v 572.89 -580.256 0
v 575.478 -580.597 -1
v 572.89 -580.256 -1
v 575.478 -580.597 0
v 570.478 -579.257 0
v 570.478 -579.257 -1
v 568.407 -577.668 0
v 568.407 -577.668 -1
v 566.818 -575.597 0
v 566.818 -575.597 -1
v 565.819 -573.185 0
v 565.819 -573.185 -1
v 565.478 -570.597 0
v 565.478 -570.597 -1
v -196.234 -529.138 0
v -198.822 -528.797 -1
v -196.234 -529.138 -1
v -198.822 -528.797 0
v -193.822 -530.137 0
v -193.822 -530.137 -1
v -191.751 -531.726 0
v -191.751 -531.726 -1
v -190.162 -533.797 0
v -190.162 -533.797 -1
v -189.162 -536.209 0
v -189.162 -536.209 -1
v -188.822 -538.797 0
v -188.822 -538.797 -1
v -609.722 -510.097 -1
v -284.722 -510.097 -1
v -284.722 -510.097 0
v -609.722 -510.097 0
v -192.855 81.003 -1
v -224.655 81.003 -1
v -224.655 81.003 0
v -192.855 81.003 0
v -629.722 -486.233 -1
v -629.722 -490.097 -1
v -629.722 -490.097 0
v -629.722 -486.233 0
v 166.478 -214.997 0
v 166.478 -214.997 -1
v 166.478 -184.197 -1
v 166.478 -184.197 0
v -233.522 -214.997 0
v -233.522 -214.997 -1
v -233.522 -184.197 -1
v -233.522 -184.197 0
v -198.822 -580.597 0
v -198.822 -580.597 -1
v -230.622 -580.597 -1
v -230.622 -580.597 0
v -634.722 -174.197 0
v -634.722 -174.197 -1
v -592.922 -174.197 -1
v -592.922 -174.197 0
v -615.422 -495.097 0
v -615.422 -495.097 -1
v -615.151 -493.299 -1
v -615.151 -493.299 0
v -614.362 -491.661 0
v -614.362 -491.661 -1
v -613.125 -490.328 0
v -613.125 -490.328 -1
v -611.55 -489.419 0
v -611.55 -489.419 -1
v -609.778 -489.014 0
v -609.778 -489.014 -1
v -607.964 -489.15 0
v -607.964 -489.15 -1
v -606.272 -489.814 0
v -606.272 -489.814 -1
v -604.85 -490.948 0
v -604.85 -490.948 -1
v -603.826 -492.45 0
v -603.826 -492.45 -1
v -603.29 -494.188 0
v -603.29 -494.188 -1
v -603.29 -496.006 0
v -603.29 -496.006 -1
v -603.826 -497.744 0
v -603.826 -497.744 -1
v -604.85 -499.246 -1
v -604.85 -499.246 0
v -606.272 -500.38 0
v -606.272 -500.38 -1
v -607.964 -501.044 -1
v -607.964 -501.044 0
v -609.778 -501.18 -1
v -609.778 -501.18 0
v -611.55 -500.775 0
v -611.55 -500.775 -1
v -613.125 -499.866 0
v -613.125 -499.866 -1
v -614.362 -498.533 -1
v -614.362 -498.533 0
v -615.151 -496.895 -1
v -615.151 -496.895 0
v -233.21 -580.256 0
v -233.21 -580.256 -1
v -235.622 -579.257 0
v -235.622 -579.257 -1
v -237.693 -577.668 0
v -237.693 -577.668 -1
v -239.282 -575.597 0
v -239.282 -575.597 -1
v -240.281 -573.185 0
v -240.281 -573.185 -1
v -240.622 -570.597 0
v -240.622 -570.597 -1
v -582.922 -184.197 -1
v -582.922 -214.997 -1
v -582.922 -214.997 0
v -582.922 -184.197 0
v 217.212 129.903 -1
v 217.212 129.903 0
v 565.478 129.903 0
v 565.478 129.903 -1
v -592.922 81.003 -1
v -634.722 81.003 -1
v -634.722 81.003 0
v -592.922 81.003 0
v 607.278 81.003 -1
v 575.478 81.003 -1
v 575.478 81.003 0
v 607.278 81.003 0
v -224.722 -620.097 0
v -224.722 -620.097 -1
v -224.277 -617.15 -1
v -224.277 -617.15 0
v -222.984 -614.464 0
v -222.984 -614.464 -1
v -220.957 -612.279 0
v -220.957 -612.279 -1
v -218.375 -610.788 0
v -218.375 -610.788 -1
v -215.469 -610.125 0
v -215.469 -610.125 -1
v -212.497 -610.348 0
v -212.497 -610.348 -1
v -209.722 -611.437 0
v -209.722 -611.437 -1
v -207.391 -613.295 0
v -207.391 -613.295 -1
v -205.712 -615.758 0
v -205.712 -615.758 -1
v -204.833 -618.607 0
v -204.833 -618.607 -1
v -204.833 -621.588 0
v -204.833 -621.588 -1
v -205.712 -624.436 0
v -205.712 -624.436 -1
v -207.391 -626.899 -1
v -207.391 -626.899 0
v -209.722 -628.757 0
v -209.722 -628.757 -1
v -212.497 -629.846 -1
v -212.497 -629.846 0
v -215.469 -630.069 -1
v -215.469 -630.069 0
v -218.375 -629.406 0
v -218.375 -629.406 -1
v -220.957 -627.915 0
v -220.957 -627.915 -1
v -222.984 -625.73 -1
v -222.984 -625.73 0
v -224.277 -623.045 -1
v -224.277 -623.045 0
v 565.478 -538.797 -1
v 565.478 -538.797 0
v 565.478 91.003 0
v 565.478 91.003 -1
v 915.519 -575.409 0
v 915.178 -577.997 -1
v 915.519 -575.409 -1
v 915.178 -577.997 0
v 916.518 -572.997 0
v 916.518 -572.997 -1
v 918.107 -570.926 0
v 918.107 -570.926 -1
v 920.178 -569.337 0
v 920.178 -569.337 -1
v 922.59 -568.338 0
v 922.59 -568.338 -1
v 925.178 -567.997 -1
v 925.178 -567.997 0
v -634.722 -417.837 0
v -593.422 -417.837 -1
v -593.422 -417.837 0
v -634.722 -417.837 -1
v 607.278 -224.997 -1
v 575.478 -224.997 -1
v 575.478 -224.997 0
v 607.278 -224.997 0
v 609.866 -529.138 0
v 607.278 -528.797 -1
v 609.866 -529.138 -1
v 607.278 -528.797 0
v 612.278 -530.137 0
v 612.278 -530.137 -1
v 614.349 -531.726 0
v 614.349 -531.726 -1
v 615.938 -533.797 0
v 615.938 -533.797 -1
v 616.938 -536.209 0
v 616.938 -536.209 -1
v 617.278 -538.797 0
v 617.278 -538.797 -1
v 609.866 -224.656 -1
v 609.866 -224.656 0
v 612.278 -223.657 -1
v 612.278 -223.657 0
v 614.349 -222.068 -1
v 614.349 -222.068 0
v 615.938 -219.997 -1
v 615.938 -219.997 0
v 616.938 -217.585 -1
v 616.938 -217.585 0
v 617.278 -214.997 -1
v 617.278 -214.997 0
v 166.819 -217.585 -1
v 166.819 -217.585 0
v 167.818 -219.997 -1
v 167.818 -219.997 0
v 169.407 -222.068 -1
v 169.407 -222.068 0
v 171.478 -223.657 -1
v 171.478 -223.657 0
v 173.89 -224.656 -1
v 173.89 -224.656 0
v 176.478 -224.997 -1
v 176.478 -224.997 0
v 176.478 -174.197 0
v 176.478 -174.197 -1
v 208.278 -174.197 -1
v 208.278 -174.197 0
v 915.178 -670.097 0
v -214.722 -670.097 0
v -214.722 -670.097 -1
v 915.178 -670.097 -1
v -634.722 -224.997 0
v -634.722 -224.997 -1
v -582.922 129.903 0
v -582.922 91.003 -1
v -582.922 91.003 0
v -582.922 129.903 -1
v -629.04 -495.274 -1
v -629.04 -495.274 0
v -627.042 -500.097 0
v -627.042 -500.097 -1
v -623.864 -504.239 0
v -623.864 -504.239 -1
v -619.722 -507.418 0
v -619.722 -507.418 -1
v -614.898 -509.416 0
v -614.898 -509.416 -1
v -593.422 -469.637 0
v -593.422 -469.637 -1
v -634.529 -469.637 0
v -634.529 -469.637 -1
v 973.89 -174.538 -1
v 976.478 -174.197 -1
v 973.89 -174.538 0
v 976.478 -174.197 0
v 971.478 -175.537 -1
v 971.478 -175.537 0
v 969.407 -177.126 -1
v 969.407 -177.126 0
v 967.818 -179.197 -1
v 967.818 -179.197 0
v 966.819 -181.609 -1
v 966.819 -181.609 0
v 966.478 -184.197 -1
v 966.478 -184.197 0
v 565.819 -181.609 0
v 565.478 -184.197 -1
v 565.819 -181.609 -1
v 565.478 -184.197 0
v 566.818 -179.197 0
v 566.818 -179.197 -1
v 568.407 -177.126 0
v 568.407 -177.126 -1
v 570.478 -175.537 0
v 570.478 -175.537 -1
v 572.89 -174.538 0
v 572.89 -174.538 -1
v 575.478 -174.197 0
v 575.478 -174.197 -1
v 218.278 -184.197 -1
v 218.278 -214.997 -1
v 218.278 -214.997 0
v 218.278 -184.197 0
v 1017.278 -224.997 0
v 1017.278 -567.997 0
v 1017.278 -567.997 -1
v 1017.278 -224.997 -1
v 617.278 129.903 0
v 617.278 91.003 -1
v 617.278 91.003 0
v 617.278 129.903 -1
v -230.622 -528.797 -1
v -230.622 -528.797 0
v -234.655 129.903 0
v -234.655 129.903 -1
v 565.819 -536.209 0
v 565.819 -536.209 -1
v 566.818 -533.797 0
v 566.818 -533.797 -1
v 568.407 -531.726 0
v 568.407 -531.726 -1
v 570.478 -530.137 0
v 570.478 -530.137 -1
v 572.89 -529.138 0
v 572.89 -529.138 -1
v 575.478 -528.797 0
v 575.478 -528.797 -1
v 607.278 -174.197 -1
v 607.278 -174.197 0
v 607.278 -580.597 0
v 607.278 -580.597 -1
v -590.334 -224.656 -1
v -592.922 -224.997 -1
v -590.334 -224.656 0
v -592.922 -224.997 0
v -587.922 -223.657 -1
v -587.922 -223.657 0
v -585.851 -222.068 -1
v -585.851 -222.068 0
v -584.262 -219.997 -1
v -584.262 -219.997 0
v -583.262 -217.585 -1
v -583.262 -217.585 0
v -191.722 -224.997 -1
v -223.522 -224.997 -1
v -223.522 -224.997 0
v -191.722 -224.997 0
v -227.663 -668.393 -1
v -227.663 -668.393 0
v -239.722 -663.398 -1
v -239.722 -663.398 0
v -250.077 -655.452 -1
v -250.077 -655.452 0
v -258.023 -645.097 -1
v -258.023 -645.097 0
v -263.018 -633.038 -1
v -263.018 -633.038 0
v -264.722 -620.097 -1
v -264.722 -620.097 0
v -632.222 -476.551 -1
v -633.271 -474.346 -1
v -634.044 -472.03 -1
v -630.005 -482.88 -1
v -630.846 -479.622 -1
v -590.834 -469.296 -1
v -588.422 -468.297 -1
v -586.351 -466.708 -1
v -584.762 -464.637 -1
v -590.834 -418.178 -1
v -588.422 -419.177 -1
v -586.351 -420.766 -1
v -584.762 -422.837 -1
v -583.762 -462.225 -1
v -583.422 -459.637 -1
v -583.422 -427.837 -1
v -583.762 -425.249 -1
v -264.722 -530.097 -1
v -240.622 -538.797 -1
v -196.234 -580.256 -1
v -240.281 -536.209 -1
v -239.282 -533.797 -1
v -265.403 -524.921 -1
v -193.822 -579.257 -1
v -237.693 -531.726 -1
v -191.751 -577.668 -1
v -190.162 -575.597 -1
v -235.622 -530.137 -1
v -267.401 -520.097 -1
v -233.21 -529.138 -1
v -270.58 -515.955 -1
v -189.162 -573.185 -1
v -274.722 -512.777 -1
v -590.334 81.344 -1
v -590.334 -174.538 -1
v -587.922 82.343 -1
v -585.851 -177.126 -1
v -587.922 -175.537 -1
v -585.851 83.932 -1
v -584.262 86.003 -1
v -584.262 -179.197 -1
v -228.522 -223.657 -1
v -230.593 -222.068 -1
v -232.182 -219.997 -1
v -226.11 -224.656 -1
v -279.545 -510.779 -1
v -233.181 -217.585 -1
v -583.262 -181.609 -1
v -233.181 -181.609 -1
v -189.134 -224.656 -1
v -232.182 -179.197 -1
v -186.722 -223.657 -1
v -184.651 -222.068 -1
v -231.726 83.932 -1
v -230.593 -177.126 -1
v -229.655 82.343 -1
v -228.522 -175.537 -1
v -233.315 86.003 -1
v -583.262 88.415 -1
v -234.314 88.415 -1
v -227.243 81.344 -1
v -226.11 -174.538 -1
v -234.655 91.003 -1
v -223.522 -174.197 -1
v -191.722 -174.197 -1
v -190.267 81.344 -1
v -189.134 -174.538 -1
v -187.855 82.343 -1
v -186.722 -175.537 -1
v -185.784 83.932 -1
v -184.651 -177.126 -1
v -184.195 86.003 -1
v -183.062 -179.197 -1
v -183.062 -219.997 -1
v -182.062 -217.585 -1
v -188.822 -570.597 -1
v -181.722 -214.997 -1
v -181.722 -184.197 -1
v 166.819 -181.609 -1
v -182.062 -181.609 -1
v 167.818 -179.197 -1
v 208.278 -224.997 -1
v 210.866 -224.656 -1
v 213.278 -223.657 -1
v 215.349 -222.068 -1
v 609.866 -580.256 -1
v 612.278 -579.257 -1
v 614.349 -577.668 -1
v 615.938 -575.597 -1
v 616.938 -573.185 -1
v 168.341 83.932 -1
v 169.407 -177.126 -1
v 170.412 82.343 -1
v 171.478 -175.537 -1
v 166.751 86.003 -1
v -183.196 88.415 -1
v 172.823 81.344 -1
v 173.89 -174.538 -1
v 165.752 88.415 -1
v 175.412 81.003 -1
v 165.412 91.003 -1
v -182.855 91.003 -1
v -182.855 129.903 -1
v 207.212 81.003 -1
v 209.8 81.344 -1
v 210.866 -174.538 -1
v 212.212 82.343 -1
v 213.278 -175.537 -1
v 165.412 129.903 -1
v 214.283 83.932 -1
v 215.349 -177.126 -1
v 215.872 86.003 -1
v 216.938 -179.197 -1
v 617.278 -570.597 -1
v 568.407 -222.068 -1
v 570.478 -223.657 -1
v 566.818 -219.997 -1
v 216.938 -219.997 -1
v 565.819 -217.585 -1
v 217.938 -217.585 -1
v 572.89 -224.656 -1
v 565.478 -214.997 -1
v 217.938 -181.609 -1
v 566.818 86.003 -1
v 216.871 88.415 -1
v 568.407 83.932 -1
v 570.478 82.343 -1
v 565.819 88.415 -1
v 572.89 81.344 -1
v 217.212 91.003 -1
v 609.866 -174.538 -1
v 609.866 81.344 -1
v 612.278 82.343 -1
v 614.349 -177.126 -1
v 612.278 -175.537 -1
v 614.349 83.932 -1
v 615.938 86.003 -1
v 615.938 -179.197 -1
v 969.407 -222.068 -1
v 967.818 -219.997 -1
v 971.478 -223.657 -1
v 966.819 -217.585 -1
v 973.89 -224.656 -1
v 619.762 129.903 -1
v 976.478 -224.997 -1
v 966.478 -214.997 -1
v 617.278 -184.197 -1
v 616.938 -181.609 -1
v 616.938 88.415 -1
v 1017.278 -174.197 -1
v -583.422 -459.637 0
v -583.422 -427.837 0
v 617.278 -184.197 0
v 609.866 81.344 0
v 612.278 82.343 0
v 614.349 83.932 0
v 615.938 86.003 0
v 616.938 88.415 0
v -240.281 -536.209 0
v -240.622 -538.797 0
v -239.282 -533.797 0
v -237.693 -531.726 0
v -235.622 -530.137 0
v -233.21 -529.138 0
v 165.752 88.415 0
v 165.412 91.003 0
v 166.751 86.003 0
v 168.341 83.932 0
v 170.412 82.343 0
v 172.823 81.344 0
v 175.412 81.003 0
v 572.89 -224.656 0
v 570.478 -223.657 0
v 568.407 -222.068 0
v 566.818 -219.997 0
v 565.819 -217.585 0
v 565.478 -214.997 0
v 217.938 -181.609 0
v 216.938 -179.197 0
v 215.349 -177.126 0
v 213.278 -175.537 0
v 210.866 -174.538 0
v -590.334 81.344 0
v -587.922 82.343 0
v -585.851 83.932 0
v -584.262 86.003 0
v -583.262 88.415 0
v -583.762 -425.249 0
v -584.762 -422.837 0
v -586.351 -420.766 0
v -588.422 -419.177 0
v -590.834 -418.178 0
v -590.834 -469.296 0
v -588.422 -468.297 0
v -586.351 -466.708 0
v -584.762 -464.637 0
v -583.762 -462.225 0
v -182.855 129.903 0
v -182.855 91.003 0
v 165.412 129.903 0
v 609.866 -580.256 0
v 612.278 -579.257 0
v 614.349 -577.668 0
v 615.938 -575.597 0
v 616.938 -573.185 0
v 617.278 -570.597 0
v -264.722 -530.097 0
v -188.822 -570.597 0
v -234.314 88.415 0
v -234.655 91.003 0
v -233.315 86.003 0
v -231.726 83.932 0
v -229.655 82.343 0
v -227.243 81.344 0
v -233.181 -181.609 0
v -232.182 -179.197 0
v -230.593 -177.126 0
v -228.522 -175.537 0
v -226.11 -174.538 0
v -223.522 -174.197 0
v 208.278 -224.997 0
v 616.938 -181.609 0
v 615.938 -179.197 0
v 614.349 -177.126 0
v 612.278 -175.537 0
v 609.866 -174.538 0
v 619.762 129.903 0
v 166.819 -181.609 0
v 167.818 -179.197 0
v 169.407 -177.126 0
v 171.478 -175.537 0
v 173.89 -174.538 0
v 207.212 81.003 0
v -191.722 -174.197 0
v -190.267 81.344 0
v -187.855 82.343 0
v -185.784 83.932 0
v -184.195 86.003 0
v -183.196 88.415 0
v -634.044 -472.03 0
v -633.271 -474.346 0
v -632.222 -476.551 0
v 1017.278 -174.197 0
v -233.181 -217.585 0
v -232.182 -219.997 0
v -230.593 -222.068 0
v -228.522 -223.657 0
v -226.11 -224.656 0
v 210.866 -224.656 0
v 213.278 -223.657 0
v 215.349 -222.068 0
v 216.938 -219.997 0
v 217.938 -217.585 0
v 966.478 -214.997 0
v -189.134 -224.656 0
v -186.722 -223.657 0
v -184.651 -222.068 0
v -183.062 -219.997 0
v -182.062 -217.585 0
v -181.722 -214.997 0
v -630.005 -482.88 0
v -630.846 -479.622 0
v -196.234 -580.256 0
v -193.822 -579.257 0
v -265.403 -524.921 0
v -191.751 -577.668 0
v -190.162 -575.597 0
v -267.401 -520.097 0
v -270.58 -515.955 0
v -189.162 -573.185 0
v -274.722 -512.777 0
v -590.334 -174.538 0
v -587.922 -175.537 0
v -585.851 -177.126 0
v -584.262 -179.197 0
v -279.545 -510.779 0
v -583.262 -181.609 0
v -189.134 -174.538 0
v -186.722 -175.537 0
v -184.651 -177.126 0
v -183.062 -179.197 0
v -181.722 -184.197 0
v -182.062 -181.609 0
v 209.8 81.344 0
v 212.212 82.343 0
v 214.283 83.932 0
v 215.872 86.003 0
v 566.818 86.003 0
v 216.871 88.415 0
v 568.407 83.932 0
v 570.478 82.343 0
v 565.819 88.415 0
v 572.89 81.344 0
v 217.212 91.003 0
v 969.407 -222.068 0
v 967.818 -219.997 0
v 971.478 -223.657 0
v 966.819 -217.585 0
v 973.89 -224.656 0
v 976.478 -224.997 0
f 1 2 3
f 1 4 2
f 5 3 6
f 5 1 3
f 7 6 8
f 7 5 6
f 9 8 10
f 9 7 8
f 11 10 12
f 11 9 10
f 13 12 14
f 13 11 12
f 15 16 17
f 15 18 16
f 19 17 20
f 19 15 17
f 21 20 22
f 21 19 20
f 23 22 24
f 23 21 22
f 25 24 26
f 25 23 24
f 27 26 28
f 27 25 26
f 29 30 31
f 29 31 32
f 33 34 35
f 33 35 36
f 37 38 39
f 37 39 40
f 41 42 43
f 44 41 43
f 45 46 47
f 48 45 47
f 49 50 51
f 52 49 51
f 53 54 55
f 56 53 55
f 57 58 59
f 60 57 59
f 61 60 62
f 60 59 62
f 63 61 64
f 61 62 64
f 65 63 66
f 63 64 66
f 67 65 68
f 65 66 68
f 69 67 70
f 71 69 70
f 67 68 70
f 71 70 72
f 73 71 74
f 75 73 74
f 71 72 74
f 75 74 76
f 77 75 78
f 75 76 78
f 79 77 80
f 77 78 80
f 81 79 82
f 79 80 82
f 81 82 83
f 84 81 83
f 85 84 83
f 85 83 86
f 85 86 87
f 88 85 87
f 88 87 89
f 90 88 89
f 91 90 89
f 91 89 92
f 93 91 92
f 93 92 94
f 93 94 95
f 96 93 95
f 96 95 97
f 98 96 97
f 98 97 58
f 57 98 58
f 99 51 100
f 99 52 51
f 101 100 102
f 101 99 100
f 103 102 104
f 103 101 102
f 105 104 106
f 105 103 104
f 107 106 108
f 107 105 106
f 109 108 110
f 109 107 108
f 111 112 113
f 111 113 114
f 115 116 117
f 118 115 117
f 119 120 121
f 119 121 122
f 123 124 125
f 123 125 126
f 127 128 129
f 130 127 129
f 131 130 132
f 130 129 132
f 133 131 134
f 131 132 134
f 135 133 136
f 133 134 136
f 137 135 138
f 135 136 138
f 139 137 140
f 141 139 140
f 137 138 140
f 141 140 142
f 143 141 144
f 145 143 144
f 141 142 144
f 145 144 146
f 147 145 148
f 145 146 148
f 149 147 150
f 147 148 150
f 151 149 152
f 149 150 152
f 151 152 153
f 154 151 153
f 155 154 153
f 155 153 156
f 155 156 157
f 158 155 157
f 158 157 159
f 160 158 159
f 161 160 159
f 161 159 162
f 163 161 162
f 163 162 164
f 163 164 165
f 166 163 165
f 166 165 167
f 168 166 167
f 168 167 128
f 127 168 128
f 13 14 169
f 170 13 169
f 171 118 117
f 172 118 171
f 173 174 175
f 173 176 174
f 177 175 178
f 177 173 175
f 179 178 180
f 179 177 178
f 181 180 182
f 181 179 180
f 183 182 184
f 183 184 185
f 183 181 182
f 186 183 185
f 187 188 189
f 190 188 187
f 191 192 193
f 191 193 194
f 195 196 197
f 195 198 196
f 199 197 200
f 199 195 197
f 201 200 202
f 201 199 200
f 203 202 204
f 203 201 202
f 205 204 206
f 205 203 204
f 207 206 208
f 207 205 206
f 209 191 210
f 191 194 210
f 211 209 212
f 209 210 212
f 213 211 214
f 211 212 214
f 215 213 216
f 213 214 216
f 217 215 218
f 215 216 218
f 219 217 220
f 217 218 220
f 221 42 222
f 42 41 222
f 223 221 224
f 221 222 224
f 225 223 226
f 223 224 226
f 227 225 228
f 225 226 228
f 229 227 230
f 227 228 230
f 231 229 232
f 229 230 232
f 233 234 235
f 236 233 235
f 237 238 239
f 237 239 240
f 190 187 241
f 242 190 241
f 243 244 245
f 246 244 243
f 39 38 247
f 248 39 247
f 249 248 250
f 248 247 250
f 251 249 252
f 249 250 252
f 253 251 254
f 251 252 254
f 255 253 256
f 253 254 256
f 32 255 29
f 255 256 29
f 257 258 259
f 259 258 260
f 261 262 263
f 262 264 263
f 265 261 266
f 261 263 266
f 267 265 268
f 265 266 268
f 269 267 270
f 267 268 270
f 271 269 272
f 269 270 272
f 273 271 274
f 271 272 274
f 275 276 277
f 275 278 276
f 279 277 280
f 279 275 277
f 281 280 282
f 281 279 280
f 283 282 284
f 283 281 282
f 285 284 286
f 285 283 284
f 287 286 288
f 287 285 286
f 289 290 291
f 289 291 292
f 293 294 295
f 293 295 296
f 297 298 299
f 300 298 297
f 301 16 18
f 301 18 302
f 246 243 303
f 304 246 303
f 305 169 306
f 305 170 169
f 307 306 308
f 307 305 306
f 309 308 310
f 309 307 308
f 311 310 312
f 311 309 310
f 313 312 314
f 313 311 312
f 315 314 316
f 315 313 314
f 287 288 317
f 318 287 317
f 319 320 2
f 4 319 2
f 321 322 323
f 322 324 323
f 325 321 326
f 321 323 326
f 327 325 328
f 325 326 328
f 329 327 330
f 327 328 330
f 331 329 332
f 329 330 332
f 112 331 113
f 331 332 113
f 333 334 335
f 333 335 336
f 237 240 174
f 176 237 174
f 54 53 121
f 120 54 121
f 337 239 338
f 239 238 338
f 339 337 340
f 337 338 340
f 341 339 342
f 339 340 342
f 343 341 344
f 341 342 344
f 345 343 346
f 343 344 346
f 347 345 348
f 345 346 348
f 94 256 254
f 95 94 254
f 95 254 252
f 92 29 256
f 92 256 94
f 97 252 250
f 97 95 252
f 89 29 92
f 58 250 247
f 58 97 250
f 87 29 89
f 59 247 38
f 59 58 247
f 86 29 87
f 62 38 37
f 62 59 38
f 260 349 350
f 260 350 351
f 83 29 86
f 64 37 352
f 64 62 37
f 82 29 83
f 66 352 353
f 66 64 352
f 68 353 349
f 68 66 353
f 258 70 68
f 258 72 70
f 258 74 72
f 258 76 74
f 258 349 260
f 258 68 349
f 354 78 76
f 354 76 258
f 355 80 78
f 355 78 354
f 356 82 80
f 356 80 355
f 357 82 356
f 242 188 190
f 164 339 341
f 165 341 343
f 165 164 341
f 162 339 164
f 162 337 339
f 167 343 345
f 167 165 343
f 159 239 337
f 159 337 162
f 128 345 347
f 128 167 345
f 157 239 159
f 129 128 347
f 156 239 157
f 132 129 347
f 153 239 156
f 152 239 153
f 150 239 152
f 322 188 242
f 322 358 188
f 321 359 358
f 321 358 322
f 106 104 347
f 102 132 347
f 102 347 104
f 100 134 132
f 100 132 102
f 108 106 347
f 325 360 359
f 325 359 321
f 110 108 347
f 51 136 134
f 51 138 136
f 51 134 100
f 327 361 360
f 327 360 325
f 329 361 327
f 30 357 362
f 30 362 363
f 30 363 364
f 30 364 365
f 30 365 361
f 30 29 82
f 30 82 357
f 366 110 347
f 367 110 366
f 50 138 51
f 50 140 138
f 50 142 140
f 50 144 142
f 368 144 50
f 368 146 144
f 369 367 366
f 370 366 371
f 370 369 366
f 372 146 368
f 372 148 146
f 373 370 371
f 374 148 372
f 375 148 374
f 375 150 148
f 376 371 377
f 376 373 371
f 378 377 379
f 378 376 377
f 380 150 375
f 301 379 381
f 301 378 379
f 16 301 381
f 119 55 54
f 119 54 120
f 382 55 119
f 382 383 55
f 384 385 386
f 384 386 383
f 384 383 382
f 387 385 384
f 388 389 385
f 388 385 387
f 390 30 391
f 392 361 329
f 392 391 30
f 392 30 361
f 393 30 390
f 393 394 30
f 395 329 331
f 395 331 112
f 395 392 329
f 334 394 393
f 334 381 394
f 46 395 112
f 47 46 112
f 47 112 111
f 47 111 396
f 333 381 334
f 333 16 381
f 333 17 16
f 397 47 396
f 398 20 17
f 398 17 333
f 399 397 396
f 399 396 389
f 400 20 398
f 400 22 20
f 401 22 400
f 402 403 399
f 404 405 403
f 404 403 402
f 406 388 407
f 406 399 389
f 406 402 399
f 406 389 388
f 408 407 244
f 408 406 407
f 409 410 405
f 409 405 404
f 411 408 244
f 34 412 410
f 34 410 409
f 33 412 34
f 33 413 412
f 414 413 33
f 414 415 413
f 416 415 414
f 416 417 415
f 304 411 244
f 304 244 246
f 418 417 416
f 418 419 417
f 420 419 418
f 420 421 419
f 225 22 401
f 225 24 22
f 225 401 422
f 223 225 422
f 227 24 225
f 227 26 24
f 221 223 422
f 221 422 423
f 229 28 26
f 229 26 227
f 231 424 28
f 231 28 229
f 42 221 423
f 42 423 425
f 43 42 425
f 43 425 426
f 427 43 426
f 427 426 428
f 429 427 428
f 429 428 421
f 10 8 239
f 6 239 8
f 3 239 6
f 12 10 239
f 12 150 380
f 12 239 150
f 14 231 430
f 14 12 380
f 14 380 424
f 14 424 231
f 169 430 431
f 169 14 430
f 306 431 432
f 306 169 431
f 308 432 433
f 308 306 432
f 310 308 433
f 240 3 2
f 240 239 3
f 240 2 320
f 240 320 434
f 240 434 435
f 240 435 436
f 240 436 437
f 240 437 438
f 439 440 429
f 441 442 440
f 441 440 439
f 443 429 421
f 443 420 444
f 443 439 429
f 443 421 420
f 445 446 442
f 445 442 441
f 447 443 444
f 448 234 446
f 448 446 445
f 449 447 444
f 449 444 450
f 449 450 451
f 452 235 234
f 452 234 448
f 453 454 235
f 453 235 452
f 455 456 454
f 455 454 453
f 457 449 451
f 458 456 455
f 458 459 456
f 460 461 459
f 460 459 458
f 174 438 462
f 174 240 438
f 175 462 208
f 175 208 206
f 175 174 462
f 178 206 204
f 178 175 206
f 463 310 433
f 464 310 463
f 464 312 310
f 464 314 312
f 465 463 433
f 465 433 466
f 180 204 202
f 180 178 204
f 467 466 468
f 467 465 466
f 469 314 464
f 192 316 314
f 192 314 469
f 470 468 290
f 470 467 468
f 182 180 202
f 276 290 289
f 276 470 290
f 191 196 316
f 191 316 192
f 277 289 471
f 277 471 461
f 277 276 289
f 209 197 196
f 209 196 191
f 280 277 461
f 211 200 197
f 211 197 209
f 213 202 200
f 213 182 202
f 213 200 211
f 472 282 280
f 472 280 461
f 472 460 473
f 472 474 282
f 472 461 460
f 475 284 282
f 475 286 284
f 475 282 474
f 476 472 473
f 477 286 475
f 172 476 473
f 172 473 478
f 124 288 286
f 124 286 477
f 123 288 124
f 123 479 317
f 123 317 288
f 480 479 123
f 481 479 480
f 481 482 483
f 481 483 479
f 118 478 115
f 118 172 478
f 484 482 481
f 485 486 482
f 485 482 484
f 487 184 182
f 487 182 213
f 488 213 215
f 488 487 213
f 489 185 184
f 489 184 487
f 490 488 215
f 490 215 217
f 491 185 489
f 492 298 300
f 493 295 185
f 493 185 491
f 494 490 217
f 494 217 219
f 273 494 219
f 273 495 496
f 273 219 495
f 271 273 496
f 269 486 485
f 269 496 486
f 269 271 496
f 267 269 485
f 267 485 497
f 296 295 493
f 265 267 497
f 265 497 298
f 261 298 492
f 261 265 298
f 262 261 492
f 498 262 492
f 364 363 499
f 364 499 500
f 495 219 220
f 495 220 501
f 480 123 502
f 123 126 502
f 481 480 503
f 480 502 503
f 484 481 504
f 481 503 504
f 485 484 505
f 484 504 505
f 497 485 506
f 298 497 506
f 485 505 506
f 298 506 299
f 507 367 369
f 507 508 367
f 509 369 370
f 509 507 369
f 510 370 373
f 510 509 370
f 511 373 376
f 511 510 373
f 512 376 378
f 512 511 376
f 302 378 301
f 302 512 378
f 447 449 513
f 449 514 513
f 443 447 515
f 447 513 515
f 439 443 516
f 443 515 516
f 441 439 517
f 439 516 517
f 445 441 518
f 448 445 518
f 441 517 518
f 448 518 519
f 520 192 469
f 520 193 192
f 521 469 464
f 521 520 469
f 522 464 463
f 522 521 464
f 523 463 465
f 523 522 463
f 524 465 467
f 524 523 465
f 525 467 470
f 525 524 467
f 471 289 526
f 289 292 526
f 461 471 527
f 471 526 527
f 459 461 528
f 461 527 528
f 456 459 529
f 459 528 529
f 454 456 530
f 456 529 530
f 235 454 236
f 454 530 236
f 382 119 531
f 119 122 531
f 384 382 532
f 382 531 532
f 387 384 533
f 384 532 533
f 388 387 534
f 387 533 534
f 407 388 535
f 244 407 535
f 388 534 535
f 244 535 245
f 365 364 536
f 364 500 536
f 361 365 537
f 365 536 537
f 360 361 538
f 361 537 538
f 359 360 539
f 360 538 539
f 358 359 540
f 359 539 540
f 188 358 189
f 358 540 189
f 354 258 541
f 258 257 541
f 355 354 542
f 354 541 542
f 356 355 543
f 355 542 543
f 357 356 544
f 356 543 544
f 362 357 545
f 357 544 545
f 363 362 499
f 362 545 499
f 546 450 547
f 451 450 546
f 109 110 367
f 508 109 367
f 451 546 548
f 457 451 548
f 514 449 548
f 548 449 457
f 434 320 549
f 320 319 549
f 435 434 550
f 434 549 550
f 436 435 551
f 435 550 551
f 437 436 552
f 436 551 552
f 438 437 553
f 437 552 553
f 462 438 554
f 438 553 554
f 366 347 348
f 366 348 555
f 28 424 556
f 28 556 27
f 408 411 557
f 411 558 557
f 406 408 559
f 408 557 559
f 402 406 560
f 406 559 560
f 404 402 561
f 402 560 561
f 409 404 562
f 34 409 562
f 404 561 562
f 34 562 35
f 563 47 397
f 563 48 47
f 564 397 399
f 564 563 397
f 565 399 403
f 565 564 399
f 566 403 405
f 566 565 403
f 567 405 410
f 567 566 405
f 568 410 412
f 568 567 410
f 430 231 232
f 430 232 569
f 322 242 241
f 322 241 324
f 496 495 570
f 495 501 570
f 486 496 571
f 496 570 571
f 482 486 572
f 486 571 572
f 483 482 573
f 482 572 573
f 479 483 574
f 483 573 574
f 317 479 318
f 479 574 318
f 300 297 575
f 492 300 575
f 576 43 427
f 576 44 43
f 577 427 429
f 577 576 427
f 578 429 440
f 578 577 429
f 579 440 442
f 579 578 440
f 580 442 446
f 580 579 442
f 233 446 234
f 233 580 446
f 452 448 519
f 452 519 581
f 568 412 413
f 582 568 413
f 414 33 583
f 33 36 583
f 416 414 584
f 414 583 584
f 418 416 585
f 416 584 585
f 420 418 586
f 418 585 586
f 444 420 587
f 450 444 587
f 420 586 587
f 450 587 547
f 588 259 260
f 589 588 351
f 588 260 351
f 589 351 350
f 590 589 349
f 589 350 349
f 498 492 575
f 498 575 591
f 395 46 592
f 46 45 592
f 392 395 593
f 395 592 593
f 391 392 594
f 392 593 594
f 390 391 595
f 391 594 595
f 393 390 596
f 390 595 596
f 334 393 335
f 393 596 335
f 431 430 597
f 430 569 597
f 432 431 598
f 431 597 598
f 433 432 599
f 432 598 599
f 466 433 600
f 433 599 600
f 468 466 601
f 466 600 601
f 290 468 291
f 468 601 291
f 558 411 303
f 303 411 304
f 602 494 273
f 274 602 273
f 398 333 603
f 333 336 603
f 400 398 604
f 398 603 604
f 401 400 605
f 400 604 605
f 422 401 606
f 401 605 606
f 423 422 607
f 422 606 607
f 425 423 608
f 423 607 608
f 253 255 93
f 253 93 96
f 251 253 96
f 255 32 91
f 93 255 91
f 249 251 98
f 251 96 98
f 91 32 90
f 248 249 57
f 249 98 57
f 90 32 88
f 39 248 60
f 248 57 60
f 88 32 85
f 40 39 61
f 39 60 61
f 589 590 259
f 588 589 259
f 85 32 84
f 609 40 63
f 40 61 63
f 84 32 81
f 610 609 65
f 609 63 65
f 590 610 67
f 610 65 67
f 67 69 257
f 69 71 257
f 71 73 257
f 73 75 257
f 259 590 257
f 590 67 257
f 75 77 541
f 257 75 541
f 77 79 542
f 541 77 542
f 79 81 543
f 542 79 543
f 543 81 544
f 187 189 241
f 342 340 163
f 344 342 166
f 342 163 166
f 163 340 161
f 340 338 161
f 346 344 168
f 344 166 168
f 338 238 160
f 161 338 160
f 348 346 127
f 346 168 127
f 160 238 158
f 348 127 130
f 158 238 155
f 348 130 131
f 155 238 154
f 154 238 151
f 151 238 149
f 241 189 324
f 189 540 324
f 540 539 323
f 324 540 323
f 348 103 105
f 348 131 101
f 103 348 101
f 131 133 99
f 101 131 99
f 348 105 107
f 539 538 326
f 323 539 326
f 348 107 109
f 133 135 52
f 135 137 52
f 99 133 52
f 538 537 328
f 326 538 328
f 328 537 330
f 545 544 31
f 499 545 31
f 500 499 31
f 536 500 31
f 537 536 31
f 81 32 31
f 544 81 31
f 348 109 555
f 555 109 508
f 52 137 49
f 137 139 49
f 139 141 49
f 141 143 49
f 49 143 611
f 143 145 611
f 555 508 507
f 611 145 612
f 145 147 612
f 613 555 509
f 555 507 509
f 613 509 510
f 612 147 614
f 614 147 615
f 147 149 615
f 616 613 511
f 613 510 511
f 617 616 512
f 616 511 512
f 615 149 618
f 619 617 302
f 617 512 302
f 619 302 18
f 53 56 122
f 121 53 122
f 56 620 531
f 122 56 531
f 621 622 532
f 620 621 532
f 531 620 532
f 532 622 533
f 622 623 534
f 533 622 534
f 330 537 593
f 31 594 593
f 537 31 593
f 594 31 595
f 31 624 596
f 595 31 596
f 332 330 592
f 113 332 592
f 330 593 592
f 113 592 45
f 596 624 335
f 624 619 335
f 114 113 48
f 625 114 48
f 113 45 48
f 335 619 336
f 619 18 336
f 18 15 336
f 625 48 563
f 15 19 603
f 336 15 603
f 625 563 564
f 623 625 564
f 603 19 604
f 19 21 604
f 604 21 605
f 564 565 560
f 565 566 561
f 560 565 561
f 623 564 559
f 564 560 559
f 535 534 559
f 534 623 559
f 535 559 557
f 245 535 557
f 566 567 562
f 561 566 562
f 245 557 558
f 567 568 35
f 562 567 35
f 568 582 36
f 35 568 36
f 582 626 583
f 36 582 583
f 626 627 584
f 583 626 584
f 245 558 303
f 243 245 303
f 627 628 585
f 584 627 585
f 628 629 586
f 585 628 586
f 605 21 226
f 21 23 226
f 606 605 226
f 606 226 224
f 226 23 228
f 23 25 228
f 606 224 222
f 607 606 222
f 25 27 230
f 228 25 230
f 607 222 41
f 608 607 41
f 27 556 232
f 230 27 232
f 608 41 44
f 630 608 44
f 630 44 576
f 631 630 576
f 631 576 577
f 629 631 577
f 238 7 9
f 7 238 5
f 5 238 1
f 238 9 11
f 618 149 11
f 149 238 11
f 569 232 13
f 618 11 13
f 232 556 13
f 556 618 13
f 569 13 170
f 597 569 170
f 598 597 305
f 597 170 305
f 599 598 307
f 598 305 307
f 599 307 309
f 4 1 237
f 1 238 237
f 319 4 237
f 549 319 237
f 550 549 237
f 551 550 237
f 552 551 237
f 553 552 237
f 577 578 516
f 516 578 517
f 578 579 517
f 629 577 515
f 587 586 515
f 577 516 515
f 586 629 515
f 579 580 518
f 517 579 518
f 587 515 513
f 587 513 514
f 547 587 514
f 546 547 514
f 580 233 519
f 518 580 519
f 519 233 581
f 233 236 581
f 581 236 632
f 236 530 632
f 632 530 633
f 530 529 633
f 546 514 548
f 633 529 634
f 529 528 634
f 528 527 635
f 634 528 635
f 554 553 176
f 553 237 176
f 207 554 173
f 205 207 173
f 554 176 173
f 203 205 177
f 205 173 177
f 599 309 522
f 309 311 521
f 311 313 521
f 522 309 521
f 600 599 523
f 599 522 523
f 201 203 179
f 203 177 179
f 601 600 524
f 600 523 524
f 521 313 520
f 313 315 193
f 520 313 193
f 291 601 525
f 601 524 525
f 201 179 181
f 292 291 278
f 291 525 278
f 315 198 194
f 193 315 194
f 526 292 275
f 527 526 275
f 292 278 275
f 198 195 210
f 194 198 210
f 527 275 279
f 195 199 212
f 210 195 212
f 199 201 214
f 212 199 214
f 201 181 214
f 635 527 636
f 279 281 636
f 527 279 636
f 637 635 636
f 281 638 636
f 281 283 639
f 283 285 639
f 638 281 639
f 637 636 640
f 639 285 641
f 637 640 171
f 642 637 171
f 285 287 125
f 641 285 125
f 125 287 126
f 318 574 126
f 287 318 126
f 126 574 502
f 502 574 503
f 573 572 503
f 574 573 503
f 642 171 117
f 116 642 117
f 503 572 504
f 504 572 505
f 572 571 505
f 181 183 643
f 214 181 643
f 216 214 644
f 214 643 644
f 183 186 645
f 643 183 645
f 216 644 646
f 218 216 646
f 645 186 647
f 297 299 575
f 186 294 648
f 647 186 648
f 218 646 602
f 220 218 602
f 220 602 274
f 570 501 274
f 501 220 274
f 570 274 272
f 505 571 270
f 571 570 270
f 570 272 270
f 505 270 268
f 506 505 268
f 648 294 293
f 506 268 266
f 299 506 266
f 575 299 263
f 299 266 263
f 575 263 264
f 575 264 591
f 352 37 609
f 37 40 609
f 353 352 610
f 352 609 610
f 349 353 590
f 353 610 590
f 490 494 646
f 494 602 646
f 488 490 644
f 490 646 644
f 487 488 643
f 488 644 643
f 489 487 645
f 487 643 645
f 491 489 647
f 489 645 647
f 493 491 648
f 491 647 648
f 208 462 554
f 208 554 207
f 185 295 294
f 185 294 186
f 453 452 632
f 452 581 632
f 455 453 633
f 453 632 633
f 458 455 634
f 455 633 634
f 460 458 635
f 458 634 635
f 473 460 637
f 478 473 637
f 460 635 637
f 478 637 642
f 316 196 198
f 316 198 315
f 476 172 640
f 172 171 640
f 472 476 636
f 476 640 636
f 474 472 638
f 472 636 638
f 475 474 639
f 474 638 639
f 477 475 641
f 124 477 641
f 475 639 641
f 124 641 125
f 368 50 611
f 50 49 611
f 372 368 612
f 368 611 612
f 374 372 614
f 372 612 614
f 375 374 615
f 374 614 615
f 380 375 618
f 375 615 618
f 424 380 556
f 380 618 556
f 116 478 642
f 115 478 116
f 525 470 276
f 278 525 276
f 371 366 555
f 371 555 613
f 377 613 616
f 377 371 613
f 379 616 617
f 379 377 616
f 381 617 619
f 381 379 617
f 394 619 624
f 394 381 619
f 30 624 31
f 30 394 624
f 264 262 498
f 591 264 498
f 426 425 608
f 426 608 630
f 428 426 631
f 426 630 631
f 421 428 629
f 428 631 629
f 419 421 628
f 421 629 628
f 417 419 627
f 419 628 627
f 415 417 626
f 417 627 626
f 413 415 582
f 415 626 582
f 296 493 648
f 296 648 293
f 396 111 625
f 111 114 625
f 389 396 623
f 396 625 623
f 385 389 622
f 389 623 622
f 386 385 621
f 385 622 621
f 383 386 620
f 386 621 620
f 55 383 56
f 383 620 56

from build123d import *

# Parameters (mm, degrees)
CROQUIS1_W            = 1652
CROQUIS1_H            = 800
BRIDA_BASE1_DEPTH     = 1
CROQUIS14_W           = 51.8
CROQUIS14_H           = 50.8
CROQUIS14_W_2         = 50.8
CORTAR_EXTRUIR1_DEPTH = 1219.148680595
REDONDEO1_R           = 10
REDONDEO2_R           = 10
CROQUIS17_W           = 370
CROQUIS17_H           = 160
CROQUIS17_W_2         = 5
CROQUIS17_H_2         = 30
CROQUIS17_R           = 6.1
CORTAR_EXTRUIR2_DEPTH = 10
REDONDEO3_R           = 50
REDONDEO4_R           = 20
CROQUIS18_R           = 10
CROQUIS18_W           = 51.8
CROQUIS18_H           = 51.8
CROQUIS18_W_2         = 102.1
CROQUIS18_H_2         = 102.1
CORTAR_EXTRUIR3_DEPTH = 10
REDONDEO5_R           = 10
REDONDEO6_R           = 20
REDONDEO7_R           = 10


# Sheet-metal steps are written as plain solids
with BuildPart() as part:
    # Brida base1: sheet metal written as solids
    # Croquis1 → Brida base1 (new body)
    with BuildSketch(Plane.XY):
        with Locations((191.278244715, -270.097142857)):
            Rectangle(CROQUIS1_W, CROQUIS1_H)
    extrude(amount=-BRIDA_BASE1_DEPTH)

    # Croquis14 → Cortar-Extruir1 (cut, through all)
    with BuildSketch(Plane.XY.offset(-1)):
        with Locations((-608.821755285, -199.597142857)):
            Rectangle(CROQUIS14_W, CROQUIS14_H)
        with Locations((991.878244715, -199.597142857)):
            Rectangle(CROQUIS14_W_2, CROQUIS14_H)
        with Locations((591.378244715, -199.597142857)):
            Rectangle(CROQUIS14_W, CROQUIS14_H)
        Polygon((617.278244715, 81.002857143), (617.278244715, 131.802857143), (565.478244715, 131.802857143), (565.478244715, 81.002857143), (591.378244715, 81.002857143), align=None)
        Polygon((617.278244715, 131.802857143), (1017.278244715, -174.197142857), (1017.278244715, 131.802857143), align=None)
        with Locations((-207.621755285, -199.597142857)):
            Rectangle(CROQUIS14_W, CROQUIS14_H)
        with Locations((192.378244715, -199.597142857)):
            Rectangle(CROQUIS14_W, CROQUIS14_H)
        with Locations((191.311578048, 106.402857143)):
            Rectangle(CROQUIS14_W, CROQUIS14_H)
        with Locations((-208.755088618, 106.402857143)):
            Rectangle(CROQUIS14_W, CROQUIS14_H)
        with Locations((-608.821755285, 106.402857143)):
            Rectangle(CROQUIS14_W, CROQUIS14_H)
    extrude(amount=CORTAR_EXTRUIR1_DEPTH, mode=Mode.SUBTRACT)

    # Redondeo1
    redondeo1_edges = [part.edges().sort_by_distance(p)[0] for p in [
        (617.278244715, -224.997142857, -0.5),
    ]]
    fillet(redondeo1_edges, radius=REDONDEO1_R)

    # Redondeo2
    redondeo2_edges = [part.edges().sort_by_distance(p)[0] for p in [
        (-582.921755285, -174.197142857, -0.5),
        (-582.921755285, -224.997142857, -0.5),
        (-181.721755285, -174.197142857, -0.5),
        (-233.521755285, -174.197142857, -0.5),
        (-233.521755285, -224.997142857, -0.5),
        (-181.721755285, -224.997142857, -0.5),
        (166.478244715, -174.197142857, -0.5),
        (166.478244715, -224.997142857, -0.5),
        (218.278244715, -224.997142857, -0.5),
        (218.278244715, -174.197142857, -0.5),
        (617.278244715, -174.197142857, -0.5),
        (565.478244715, -174.197142857, -0.5),
        (565.478244715, -224.997142857, -0.5),
        (966.478244715, -224.997142857, -0.5),
        (966.478244715, -174.197142857, -0.5),
        (565.478244715, 81.002857143, -0.5),
        (617.278244715, 81.002857143, -0.5),
        (-582.921755285, 81.002857143, -0.5),
        (-234.655088618, 81.002857143, -0.5),
        (-182.855088618, 81.002857143, -0.5),
        (165.411578048, 81.002857143, -0.5),
        (217.211578048, 81.002857143, -0.5),
    ]]
    fillet(redondeo2_edges, radius=REDONDEO2_R)

    # Croquis17 → Cortar-Extruir2 (cut)
    with BuildSketch(Plane(origin=(0, 0, -1), x_dir=(-1, 0, 0), z_dir=(0, 0, -1))):
        with Locations((449.721755285, -590.097142857)):
            Rectangle(CROQUIS17_W, CROQUIS17_H)
        with Locations((632.221755285, -495.097142857)):
            Rectangle(CROQUIS17_W_2, CROQUIS17_H_2)
        with Locations((609.321755285, -495.097142857)):
            Circle(CROQUIS17_R)
    extrude(amount=-CORTAR_EXTRUIR2_DEPTH, mode=Mode.SUBTRACT)

    # Redondeo3
    redondeo3_edges = [part.edges().sort_by_distance(p)[0] for p in [
        (-264.721755285, -670.097142857, -0.5),
        (1017.278244715, -670.097142857, -0.5),
    ]]
    fillet(redondeo3_edges, radius=REDONDEO3_R)

    # Redondeo4
    # the kernel refuses this fillet: 20 mm, written as the material it adds along each edge
    with BuildSketch(Plane(origin=(-264.721755285, -510.097142857, -1), x_dir=(0, -1, 0), z_dir=(0, 0, 1))) as redondeo4_piece_1:
        with BuildLine():
            CenterArc((REDONDEO4_R, -REDONDEO4_R), REDONDEO4_R, 90, 90)
            Line((0, -REDONDEO4_R), (0, 0))
            Line((0, 0), (REDONDEO4_R, 0))
        make_face()
    extrude(amount=1)
    # the kernel refuses this fillet: 20 mm, written as the material it takes off along each edge
    with BuildSketch(Plane(origin=(-629.721755285, -510.097142857, -51), x_dir=(1, 0, 0), z_dir=(0, 0, 1))) as redondeo4_2_piece_1:
        with BuildLine():
            CenterArc((REDONDEO4_R, REDONDEO4_R), REDONDEO4_R, 180, 90)
            Line((0, REDONDEO4_R), (0, 0))
            Line((0, 0), (REDONDEO4_R, 0))
        make_face()
    extrude(amount=101, mode=Mode.SUBTRACT)
    with BuildSketch(Plane(origin=(-634.721755285, -480.097142857, -34.071891388), x_dir=(1, 0, 0), z_dir=(0, 0, 1))) as redondeo4_2_piece_2:
        with BuildLine():
            CenterArc((20, 13.228756555), REDONDEO4_R, 180, 41.409622109)
            Line((0, 13.228756555), (0, 0))
            Line((0, 0), (5, 0))
        make_face()
    extrude(amount=67.143782777, mode=Mode.SUBTRACT)

    # Croquis18 → Cortar-Extruir3 (cut)
    with BuildSketch(Plane(origin=(0, 0, -1), x_dir=(-1, 0, 0), z_dir=(0, 0, -1))):
        with Locations((214.721755285, -620.097142857)):
            Circle(CROQUIS18_R)
        with Locations((609.321755285, -443.737142857)):
            Rectangle(CROQUIS18_W, CROQUIS18_H)
        with Locations((-591.378244715, -554.697142857)):
            Rectangle(CROQUIS18_W, CROQUIS18_H)
        with Locations((-966.228244715, -619.047142857)):
            Rectangle(CROQUIS18_W_2, CROQUIS18_H_2)
        with Locations((214.721755285, -554.697142857)):
            Rectangle(CROQUIS18_W, CROQUIS18_H)
    extrude(amount=-CORTAR_EXTRUIR3_DEPTH, mode=Mode.SUBTRACT)

    # Redondeo5
    redondeo5_edges = [part.edges().sort_by_distance(p)[0] for p in [
        (565.478244715, -528.797142857, -0.5),
        (565.478244715, -580.597142857, -0.5),
        (617.278244715, -580.597142857, -0.5),
        (617.278244715, -528.797142857, -0.5),
        (915.178244715, -567.997142857, -0.5),
        (-188.821755285, -528.797142857, -0.5),
        (-240.621755285, -528.797142857, -0.5),
        (-240.621755285, -580.597142857, -0.5),
        (-188.821755285, -580.597142857, -0.5),
    ]]
    fillet(redondeo5_edges, radius=REDONDEO5_R)

    # Redondeo6
    redondeo6_edges = [part.edges().sort_by_distance(p)[0] for p in [
        (-629.721755285, -480.097142857, -0.5),
    ]]
    fillet(redondeo6_edges, radius=REDONDEO6_R)

    # Redondeo7
    redondeo7_edges = [part.edges().sort_by_distance(p)[0] for p in [
        (-583.421755285, -469.637142857, -0.5),
        (-583.421755285, -417.837142857, -0.5),
    ]]
    fillet(redondeo7_edges, radius=REDONDEO7_R)


solid = part.part
